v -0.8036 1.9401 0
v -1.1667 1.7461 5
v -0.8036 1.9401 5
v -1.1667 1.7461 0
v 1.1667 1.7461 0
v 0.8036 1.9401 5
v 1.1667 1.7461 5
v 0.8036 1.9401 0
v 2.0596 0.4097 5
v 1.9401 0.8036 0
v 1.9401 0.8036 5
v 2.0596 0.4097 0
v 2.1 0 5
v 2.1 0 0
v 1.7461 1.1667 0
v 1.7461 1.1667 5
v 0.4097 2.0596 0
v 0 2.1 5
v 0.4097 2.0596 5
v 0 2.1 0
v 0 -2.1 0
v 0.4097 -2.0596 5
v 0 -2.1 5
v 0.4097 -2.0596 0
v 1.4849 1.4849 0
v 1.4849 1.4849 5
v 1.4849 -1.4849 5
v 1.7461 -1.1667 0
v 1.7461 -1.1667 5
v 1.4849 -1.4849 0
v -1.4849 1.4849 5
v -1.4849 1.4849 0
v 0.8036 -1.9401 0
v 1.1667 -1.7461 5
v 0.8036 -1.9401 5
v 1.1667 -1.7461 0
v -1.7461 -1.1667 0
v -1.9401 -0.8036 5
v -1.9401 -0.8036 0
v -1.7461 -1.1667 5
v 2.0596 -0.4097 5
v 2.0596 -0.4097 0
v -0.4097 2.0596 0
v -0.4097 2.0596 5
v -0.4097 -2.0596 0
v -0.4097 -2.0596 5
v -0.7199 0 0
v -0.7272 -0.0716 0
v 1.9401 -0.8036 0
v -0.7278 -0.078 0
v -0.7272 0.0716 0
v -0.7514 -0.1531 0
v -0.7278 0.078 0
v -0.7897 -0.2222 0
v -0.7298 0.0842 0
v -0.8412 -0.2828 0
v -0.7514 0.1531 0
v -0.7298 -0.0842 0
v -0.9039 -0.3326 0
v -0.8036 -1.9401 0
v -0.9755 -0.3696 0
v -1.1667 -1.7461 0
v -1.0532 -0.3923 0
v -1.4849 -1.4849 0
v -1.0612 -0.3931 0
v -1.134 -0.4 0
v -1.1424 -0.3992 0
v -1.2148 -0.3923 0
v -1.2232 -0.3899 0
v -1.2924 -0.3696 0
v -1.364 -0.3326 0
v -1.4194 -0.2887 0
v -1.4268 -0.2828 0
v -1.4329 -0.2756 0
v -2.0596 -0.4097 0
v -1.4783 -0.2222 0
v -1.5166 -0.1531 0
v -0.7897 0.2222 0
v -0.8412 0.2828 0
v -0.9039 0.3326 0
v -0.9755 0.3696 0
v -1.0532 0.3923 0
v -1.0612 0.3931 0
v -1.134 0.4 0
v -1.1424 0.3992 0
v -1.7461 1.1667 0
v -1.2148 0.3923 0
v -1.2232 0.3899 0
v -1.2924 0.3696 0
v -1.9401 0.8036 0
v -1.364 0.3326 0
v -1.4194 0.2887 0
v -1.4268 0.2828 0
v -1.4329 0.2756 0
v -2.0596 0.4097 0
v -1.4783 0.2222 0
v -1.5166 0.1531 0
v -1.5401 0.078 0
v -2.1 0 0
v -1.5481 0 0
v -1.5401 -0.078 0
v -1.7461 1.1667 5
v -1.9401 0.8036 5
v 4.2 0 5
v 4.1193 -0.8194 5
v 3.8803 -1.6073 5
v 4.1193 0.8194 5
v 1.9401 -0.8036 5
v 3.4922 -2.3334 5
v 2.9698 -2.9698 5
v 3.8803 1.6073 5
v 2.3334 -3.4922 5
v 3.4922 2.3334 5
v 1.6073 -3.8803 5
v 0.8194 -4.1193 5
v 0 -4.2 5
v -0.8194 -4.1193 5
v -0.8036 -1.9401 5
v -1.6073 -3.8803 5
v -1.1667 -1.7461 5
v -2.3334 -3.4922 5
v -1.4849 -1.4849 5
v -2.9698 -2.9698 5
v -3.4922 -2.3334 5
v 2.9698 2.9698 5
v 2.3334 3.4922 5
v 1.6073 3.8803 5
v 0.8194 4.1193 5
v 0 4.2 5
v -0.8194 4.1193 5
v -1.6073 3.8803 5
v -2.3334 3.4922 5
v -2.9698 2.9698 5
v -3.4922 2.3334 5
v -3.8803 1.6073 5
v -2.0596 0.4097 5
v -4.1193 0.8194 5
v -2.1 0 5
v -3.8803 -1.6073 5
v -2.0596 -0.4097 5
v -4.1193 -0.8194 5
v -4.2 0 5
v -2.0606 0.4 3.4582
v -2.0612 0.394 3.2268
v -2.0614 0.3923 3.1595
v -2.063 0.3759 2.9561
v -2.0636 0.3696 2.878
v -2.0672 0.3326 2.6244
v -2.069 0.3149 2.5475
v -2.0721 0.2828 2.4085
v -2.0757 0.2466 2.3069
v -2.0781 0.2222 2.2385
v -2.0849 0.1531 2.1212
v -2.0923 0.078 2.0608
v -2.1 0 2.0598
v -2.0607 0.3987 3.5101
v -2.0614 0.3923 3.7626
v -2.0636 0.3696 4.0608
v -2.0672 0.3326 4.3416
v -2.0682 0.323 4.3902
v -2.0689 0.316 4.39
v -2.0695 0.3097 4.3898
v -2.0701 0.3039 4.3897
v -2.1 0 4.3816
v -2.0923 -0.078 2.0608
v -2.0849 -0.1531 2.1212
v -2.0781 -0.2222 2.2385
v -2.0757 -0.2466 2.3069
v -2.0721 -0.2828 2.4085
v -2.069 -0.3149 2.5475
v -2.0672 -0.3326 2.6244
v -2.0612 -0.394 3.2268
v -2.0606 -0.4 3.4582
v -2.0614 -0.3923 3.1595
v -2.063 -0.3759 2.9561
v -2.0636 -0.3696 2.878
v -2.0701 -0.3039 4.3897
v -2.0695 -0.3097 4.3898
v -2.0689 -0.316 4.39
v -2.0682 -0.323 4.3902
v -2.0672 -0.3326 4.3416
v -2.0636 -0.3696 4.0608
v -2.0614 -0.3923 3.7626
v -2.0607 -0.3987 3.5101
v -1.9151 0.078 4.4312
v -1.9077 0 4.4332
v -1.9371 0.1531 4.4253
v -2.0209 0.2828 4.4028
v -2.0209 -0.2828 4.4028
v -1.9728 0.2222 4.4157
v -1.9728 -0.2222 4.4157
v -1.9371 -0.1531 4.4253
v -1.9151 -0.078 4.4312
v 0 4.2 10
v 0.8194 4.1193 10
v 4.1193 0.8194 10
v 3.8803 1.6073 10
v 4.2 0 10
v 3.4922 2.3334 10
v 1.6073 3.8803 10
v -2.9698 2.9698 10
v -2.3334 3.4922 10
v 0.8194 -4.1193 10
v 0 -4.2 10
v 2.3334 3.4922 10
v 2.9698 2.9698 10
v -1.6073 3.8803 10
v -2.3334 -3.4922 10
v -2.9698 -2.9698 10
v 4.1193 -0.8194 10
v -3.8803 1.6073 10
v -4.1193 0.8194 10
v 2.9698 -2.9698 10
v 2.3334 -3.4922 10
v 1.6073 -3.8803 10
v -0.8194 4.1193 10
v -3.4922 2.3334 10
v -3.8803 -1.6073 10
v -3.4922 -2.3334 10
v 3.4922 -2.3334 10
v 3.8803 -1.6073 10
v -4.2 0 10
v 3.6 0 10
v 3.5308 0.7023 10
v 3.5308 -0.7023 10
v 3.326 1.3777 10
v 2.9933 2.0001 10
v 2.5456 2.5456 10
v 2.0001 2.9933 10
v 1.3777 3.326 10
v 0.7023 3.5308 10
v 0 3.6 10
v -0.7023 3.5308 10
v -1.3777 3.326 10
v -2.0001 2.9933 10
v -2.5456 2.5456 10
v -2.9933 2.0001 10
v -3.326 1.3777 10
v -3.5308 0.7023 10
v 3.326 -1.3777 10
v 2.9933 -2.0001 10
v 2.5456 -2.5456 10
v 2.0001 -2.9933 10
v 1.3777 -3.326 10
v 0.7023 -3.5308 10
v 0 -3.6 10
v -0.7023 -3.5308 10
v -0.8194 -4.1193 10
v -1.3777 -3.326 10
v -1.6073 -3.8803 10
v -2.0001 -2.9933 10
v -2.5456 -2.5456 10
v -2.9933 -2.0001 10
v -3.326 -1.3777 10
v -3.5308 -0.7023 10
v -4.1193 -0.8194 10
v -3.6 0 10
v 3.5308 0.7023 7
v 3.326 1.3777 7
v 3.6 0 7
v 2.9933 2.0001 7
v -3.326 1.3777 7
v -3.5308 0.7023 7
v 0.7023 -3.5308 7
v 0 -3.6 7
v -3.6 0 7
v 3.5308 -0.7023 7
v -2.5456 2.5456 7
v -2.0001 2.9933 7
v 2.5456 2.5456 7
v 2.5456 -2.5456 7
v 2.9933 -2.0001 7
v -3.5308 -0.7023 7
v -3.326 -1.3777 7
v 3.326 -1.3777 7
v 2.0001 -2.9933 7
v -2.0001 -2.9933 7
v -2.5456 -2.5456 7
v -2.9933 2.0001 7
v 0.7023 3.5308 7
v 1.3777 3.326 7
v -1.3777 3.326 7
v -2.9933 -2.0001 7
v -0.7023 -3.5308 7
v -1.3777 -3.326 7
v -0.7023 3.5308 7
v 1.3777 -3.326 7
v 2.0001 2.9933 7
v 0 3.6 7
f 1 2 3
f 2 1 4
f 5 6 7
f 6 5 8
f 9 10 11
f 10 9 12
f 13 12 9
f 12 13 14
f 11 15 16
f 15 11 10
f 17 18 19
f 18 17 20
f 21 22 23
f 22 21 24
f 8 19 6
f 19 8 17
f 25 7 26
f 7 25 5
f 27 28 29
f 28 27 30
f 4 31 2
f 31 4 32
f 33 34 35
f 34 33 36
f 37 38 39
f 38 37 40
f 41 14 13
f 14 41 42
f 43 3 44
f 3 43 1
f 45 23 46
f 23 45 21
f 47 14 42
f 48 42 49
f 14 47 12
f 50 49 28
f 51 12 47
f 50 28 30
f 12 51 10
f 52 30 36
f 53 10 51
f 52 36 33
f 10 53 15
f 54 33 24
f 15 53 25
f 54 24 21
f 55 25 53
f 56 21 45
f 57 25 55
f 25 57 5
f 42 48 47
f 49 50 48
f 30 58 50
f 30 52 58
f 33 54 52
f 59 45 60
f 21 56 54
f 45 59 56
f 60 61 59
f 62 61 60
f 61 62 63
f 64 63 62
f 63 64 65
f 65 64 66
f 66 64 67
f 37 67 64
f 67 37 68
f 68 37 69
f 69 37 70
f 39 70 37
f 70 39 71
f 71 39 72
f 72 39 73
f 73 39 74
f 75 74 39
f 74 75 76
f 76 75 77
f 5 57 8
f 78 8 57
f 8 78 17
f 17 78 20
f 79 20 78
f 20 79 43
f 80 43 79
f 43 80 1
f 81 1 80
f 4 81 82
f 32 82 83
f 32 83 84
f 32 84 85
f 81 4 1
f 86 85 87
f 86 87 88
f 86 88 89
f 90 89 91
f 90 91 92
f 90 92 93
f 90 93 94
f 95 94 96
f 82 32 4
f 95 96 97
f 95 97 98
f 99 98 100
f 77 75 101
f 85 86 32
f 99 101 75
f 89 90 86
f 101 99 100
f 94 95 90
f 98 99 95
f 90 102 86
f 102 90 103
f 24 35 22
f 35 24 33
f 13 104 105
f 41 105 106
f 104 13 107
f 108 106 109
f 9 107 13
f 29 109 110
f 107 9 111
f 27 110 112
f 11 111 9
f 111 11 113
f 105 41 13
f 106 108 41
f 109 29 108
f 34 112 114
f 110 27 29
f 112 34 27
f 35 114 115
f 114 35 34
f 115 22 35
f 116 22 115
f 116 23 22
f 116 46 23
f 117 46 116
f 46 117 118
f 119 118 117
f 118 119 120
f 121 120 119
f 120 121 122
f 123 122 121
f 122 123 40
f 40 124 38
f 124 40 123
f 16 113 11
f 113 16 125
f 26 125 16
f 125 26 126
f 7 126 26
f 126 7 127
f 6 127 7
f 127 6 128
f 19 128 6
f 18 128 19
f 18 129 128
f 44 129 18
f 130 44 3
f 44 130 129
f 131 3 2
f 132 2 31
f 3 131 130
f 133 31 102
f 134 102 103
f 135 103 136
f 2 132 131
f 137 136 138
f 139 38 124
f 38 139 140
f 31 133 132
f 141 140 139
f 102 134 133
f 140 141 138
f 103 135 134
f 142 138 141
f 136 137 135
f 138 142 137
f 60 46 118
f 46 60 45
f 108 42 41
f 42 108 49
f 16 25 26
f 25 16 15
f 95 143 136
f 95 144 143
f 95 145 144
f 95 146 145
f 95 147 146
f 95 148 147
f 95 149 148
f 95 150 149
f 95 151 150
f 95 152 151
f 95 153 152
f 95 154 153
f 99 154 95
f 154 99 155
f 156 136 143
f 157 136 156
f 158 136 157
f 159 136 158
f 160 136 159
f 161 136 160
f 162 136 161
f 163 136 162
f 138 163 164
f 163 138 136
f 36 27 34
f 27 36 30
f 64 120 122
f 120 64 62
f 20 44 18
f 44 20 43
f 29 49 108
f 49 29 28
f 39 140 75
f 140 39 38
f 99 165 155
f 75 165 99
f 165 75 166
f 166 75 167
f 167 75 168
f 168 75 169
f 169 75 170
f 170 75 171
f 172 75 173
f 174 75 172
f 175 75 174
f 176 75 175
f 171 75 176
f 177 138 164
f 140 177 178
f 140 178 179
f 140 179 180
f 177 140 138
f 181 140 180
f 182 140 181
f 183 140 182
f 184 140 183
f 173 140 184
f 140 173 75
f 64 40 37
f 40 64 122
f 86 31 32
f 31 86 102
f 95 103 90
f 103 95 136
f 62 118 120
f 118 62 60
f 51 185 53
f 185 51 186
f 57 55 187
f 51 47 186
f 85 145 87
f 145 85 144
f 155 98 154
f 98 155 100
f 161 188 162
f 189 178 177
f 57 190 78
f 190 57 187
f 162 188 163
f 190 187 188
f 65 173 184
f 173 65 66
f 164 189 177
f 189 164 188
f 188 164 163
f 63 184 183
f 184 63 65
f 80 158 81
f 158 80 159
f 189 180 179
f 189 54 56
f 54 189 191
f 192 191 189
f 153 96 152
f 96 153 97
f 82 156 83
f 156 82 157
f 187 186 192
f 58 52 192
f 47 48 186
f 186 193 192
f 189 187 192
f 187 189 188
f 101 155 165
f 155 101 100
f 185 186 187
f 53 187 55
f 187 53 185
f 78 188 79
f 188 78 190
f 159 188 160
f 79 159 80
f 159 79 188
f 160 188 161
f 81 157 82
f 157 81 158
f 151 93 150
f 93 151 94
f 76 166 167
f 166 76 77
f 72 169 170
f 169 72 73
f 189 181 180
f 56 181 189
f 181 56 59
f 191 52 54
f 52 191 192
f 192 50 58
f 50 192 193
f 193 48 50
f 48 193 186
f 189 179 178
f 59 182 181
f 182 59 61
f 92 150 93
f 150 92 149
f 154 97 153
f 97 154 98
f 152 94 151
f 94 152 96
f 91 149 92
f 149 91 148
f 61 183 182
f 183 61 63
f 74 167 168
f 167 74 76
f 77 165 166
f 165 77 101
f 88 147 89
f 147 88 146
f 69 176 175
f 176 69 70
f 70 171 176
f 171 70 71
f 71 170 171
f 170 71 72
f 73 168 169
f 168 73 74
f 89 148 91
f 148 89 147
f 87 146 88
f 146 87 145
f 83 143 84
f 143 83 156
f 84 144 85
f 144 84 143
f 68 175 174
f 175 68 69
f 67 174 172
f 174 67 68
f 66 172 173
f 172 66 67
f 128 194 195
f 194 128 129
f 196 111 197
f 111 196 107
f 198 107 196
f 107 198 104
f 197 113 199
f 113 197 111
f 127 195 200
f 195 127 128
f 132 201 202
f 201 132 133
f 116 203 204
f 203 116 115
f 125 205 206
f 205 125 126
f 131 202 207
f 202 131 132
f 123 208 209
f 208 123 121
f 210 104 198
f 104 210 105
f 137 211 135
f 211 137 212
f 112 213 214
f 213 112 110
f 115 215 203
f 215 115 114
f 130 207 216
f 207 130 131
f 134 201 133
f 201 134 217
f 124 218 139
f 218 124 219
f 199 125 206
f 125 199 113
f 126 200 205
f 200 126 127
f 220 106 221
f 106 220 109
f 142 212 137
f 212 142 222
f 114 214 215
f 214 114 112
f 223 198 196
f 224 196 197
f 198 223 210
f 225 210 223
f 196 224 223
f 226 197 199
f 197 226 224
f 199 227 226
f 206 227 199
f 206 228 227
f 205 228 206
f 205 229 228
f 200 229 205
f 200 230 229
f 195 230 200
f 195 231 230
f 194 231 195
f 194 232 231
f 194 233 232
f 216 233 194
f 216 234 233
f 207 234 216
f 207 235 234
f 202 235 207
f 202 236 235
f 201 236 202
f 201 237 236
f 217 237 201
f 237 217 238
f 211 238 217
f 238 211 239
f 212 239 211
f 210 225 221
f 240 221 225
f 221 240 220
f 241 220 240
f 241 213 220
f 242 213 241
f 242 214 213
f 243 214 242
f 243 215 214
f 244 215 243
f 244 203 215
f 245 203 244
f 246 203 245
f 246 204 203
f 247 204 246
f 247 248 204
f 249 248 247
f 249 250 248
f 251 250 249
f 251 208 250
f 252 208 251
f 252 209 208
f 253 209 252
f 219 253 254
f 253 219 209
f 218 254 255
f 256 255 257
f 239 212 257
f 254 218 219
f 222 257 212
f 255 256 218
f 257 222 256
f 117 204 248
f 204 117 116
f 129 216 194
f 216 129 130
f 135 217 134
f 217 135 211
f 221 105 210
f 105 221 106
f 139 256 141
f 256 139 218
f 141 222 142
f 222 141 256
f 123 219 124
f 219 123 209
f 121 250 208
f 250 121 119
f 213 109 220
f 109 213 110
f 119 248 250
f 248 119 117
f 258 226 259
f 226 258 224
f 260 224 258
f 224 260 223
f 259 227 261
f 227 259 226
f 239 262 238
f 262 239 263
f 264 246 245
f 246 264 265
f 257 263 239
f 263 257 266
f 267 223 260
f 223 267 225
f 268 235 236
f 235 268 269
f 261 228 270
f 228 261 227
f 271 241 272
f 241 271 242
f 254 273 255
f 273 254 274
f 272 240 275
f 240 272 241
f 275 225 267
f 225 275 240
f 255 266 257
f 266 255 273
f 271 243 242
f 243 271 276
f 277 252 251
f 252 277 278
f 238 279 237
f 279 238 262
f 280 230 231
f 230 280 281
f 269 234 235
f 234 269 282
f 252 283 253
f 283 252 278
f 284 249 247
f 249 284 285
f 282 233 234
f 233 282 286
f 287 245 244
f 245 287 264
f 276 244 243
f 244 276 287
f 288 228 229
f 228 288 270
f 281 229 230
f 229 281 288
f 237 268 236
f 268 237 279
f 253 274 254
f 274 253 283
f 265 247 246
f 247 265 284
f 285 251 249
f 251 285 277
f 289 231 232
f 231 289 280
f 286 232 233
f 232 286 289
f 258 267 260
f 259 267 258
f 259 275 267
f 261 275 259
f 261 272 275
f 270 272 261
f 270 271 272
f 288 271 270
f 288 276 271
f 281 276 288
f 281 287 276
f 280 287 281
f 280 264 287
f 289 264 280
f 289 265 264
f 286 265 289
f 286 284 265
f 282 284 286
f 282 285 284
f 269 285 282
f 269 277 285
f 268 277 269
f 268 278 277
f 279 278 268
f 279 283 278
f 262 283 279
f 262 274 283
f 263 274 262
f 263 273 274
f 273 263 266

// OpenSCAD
$fn = 32;

hHandle = 5;
dIntHandle = 7.2;
dHandle = 8.4;

hBase = 5;
dBase = 4.2;

dWireHole = 0.8;

*translate([-0,0,-.5])
    rotate([0,-15,0])
    cylinder(h=hBase, r=dWireHole/2);


difference(){
    cylinder(h=hBase, r=dBase/2);
    
translate([-1,0,-.5])
    rotate([0,-15,0])
    cylinder(h=hBase, r=dWireHole/2);
    
    *translate([0,0,0])
    cylinder(h=hBase, r=dWireHole/2);
}

difference(){
    translate([0,0,hBase])
    cylinder(h=hHandle, r=dHandle/2);
    
    translate([0,0,hBase+2])
    cylinder(h=hHandle, r=dIntHandle/2);
}
